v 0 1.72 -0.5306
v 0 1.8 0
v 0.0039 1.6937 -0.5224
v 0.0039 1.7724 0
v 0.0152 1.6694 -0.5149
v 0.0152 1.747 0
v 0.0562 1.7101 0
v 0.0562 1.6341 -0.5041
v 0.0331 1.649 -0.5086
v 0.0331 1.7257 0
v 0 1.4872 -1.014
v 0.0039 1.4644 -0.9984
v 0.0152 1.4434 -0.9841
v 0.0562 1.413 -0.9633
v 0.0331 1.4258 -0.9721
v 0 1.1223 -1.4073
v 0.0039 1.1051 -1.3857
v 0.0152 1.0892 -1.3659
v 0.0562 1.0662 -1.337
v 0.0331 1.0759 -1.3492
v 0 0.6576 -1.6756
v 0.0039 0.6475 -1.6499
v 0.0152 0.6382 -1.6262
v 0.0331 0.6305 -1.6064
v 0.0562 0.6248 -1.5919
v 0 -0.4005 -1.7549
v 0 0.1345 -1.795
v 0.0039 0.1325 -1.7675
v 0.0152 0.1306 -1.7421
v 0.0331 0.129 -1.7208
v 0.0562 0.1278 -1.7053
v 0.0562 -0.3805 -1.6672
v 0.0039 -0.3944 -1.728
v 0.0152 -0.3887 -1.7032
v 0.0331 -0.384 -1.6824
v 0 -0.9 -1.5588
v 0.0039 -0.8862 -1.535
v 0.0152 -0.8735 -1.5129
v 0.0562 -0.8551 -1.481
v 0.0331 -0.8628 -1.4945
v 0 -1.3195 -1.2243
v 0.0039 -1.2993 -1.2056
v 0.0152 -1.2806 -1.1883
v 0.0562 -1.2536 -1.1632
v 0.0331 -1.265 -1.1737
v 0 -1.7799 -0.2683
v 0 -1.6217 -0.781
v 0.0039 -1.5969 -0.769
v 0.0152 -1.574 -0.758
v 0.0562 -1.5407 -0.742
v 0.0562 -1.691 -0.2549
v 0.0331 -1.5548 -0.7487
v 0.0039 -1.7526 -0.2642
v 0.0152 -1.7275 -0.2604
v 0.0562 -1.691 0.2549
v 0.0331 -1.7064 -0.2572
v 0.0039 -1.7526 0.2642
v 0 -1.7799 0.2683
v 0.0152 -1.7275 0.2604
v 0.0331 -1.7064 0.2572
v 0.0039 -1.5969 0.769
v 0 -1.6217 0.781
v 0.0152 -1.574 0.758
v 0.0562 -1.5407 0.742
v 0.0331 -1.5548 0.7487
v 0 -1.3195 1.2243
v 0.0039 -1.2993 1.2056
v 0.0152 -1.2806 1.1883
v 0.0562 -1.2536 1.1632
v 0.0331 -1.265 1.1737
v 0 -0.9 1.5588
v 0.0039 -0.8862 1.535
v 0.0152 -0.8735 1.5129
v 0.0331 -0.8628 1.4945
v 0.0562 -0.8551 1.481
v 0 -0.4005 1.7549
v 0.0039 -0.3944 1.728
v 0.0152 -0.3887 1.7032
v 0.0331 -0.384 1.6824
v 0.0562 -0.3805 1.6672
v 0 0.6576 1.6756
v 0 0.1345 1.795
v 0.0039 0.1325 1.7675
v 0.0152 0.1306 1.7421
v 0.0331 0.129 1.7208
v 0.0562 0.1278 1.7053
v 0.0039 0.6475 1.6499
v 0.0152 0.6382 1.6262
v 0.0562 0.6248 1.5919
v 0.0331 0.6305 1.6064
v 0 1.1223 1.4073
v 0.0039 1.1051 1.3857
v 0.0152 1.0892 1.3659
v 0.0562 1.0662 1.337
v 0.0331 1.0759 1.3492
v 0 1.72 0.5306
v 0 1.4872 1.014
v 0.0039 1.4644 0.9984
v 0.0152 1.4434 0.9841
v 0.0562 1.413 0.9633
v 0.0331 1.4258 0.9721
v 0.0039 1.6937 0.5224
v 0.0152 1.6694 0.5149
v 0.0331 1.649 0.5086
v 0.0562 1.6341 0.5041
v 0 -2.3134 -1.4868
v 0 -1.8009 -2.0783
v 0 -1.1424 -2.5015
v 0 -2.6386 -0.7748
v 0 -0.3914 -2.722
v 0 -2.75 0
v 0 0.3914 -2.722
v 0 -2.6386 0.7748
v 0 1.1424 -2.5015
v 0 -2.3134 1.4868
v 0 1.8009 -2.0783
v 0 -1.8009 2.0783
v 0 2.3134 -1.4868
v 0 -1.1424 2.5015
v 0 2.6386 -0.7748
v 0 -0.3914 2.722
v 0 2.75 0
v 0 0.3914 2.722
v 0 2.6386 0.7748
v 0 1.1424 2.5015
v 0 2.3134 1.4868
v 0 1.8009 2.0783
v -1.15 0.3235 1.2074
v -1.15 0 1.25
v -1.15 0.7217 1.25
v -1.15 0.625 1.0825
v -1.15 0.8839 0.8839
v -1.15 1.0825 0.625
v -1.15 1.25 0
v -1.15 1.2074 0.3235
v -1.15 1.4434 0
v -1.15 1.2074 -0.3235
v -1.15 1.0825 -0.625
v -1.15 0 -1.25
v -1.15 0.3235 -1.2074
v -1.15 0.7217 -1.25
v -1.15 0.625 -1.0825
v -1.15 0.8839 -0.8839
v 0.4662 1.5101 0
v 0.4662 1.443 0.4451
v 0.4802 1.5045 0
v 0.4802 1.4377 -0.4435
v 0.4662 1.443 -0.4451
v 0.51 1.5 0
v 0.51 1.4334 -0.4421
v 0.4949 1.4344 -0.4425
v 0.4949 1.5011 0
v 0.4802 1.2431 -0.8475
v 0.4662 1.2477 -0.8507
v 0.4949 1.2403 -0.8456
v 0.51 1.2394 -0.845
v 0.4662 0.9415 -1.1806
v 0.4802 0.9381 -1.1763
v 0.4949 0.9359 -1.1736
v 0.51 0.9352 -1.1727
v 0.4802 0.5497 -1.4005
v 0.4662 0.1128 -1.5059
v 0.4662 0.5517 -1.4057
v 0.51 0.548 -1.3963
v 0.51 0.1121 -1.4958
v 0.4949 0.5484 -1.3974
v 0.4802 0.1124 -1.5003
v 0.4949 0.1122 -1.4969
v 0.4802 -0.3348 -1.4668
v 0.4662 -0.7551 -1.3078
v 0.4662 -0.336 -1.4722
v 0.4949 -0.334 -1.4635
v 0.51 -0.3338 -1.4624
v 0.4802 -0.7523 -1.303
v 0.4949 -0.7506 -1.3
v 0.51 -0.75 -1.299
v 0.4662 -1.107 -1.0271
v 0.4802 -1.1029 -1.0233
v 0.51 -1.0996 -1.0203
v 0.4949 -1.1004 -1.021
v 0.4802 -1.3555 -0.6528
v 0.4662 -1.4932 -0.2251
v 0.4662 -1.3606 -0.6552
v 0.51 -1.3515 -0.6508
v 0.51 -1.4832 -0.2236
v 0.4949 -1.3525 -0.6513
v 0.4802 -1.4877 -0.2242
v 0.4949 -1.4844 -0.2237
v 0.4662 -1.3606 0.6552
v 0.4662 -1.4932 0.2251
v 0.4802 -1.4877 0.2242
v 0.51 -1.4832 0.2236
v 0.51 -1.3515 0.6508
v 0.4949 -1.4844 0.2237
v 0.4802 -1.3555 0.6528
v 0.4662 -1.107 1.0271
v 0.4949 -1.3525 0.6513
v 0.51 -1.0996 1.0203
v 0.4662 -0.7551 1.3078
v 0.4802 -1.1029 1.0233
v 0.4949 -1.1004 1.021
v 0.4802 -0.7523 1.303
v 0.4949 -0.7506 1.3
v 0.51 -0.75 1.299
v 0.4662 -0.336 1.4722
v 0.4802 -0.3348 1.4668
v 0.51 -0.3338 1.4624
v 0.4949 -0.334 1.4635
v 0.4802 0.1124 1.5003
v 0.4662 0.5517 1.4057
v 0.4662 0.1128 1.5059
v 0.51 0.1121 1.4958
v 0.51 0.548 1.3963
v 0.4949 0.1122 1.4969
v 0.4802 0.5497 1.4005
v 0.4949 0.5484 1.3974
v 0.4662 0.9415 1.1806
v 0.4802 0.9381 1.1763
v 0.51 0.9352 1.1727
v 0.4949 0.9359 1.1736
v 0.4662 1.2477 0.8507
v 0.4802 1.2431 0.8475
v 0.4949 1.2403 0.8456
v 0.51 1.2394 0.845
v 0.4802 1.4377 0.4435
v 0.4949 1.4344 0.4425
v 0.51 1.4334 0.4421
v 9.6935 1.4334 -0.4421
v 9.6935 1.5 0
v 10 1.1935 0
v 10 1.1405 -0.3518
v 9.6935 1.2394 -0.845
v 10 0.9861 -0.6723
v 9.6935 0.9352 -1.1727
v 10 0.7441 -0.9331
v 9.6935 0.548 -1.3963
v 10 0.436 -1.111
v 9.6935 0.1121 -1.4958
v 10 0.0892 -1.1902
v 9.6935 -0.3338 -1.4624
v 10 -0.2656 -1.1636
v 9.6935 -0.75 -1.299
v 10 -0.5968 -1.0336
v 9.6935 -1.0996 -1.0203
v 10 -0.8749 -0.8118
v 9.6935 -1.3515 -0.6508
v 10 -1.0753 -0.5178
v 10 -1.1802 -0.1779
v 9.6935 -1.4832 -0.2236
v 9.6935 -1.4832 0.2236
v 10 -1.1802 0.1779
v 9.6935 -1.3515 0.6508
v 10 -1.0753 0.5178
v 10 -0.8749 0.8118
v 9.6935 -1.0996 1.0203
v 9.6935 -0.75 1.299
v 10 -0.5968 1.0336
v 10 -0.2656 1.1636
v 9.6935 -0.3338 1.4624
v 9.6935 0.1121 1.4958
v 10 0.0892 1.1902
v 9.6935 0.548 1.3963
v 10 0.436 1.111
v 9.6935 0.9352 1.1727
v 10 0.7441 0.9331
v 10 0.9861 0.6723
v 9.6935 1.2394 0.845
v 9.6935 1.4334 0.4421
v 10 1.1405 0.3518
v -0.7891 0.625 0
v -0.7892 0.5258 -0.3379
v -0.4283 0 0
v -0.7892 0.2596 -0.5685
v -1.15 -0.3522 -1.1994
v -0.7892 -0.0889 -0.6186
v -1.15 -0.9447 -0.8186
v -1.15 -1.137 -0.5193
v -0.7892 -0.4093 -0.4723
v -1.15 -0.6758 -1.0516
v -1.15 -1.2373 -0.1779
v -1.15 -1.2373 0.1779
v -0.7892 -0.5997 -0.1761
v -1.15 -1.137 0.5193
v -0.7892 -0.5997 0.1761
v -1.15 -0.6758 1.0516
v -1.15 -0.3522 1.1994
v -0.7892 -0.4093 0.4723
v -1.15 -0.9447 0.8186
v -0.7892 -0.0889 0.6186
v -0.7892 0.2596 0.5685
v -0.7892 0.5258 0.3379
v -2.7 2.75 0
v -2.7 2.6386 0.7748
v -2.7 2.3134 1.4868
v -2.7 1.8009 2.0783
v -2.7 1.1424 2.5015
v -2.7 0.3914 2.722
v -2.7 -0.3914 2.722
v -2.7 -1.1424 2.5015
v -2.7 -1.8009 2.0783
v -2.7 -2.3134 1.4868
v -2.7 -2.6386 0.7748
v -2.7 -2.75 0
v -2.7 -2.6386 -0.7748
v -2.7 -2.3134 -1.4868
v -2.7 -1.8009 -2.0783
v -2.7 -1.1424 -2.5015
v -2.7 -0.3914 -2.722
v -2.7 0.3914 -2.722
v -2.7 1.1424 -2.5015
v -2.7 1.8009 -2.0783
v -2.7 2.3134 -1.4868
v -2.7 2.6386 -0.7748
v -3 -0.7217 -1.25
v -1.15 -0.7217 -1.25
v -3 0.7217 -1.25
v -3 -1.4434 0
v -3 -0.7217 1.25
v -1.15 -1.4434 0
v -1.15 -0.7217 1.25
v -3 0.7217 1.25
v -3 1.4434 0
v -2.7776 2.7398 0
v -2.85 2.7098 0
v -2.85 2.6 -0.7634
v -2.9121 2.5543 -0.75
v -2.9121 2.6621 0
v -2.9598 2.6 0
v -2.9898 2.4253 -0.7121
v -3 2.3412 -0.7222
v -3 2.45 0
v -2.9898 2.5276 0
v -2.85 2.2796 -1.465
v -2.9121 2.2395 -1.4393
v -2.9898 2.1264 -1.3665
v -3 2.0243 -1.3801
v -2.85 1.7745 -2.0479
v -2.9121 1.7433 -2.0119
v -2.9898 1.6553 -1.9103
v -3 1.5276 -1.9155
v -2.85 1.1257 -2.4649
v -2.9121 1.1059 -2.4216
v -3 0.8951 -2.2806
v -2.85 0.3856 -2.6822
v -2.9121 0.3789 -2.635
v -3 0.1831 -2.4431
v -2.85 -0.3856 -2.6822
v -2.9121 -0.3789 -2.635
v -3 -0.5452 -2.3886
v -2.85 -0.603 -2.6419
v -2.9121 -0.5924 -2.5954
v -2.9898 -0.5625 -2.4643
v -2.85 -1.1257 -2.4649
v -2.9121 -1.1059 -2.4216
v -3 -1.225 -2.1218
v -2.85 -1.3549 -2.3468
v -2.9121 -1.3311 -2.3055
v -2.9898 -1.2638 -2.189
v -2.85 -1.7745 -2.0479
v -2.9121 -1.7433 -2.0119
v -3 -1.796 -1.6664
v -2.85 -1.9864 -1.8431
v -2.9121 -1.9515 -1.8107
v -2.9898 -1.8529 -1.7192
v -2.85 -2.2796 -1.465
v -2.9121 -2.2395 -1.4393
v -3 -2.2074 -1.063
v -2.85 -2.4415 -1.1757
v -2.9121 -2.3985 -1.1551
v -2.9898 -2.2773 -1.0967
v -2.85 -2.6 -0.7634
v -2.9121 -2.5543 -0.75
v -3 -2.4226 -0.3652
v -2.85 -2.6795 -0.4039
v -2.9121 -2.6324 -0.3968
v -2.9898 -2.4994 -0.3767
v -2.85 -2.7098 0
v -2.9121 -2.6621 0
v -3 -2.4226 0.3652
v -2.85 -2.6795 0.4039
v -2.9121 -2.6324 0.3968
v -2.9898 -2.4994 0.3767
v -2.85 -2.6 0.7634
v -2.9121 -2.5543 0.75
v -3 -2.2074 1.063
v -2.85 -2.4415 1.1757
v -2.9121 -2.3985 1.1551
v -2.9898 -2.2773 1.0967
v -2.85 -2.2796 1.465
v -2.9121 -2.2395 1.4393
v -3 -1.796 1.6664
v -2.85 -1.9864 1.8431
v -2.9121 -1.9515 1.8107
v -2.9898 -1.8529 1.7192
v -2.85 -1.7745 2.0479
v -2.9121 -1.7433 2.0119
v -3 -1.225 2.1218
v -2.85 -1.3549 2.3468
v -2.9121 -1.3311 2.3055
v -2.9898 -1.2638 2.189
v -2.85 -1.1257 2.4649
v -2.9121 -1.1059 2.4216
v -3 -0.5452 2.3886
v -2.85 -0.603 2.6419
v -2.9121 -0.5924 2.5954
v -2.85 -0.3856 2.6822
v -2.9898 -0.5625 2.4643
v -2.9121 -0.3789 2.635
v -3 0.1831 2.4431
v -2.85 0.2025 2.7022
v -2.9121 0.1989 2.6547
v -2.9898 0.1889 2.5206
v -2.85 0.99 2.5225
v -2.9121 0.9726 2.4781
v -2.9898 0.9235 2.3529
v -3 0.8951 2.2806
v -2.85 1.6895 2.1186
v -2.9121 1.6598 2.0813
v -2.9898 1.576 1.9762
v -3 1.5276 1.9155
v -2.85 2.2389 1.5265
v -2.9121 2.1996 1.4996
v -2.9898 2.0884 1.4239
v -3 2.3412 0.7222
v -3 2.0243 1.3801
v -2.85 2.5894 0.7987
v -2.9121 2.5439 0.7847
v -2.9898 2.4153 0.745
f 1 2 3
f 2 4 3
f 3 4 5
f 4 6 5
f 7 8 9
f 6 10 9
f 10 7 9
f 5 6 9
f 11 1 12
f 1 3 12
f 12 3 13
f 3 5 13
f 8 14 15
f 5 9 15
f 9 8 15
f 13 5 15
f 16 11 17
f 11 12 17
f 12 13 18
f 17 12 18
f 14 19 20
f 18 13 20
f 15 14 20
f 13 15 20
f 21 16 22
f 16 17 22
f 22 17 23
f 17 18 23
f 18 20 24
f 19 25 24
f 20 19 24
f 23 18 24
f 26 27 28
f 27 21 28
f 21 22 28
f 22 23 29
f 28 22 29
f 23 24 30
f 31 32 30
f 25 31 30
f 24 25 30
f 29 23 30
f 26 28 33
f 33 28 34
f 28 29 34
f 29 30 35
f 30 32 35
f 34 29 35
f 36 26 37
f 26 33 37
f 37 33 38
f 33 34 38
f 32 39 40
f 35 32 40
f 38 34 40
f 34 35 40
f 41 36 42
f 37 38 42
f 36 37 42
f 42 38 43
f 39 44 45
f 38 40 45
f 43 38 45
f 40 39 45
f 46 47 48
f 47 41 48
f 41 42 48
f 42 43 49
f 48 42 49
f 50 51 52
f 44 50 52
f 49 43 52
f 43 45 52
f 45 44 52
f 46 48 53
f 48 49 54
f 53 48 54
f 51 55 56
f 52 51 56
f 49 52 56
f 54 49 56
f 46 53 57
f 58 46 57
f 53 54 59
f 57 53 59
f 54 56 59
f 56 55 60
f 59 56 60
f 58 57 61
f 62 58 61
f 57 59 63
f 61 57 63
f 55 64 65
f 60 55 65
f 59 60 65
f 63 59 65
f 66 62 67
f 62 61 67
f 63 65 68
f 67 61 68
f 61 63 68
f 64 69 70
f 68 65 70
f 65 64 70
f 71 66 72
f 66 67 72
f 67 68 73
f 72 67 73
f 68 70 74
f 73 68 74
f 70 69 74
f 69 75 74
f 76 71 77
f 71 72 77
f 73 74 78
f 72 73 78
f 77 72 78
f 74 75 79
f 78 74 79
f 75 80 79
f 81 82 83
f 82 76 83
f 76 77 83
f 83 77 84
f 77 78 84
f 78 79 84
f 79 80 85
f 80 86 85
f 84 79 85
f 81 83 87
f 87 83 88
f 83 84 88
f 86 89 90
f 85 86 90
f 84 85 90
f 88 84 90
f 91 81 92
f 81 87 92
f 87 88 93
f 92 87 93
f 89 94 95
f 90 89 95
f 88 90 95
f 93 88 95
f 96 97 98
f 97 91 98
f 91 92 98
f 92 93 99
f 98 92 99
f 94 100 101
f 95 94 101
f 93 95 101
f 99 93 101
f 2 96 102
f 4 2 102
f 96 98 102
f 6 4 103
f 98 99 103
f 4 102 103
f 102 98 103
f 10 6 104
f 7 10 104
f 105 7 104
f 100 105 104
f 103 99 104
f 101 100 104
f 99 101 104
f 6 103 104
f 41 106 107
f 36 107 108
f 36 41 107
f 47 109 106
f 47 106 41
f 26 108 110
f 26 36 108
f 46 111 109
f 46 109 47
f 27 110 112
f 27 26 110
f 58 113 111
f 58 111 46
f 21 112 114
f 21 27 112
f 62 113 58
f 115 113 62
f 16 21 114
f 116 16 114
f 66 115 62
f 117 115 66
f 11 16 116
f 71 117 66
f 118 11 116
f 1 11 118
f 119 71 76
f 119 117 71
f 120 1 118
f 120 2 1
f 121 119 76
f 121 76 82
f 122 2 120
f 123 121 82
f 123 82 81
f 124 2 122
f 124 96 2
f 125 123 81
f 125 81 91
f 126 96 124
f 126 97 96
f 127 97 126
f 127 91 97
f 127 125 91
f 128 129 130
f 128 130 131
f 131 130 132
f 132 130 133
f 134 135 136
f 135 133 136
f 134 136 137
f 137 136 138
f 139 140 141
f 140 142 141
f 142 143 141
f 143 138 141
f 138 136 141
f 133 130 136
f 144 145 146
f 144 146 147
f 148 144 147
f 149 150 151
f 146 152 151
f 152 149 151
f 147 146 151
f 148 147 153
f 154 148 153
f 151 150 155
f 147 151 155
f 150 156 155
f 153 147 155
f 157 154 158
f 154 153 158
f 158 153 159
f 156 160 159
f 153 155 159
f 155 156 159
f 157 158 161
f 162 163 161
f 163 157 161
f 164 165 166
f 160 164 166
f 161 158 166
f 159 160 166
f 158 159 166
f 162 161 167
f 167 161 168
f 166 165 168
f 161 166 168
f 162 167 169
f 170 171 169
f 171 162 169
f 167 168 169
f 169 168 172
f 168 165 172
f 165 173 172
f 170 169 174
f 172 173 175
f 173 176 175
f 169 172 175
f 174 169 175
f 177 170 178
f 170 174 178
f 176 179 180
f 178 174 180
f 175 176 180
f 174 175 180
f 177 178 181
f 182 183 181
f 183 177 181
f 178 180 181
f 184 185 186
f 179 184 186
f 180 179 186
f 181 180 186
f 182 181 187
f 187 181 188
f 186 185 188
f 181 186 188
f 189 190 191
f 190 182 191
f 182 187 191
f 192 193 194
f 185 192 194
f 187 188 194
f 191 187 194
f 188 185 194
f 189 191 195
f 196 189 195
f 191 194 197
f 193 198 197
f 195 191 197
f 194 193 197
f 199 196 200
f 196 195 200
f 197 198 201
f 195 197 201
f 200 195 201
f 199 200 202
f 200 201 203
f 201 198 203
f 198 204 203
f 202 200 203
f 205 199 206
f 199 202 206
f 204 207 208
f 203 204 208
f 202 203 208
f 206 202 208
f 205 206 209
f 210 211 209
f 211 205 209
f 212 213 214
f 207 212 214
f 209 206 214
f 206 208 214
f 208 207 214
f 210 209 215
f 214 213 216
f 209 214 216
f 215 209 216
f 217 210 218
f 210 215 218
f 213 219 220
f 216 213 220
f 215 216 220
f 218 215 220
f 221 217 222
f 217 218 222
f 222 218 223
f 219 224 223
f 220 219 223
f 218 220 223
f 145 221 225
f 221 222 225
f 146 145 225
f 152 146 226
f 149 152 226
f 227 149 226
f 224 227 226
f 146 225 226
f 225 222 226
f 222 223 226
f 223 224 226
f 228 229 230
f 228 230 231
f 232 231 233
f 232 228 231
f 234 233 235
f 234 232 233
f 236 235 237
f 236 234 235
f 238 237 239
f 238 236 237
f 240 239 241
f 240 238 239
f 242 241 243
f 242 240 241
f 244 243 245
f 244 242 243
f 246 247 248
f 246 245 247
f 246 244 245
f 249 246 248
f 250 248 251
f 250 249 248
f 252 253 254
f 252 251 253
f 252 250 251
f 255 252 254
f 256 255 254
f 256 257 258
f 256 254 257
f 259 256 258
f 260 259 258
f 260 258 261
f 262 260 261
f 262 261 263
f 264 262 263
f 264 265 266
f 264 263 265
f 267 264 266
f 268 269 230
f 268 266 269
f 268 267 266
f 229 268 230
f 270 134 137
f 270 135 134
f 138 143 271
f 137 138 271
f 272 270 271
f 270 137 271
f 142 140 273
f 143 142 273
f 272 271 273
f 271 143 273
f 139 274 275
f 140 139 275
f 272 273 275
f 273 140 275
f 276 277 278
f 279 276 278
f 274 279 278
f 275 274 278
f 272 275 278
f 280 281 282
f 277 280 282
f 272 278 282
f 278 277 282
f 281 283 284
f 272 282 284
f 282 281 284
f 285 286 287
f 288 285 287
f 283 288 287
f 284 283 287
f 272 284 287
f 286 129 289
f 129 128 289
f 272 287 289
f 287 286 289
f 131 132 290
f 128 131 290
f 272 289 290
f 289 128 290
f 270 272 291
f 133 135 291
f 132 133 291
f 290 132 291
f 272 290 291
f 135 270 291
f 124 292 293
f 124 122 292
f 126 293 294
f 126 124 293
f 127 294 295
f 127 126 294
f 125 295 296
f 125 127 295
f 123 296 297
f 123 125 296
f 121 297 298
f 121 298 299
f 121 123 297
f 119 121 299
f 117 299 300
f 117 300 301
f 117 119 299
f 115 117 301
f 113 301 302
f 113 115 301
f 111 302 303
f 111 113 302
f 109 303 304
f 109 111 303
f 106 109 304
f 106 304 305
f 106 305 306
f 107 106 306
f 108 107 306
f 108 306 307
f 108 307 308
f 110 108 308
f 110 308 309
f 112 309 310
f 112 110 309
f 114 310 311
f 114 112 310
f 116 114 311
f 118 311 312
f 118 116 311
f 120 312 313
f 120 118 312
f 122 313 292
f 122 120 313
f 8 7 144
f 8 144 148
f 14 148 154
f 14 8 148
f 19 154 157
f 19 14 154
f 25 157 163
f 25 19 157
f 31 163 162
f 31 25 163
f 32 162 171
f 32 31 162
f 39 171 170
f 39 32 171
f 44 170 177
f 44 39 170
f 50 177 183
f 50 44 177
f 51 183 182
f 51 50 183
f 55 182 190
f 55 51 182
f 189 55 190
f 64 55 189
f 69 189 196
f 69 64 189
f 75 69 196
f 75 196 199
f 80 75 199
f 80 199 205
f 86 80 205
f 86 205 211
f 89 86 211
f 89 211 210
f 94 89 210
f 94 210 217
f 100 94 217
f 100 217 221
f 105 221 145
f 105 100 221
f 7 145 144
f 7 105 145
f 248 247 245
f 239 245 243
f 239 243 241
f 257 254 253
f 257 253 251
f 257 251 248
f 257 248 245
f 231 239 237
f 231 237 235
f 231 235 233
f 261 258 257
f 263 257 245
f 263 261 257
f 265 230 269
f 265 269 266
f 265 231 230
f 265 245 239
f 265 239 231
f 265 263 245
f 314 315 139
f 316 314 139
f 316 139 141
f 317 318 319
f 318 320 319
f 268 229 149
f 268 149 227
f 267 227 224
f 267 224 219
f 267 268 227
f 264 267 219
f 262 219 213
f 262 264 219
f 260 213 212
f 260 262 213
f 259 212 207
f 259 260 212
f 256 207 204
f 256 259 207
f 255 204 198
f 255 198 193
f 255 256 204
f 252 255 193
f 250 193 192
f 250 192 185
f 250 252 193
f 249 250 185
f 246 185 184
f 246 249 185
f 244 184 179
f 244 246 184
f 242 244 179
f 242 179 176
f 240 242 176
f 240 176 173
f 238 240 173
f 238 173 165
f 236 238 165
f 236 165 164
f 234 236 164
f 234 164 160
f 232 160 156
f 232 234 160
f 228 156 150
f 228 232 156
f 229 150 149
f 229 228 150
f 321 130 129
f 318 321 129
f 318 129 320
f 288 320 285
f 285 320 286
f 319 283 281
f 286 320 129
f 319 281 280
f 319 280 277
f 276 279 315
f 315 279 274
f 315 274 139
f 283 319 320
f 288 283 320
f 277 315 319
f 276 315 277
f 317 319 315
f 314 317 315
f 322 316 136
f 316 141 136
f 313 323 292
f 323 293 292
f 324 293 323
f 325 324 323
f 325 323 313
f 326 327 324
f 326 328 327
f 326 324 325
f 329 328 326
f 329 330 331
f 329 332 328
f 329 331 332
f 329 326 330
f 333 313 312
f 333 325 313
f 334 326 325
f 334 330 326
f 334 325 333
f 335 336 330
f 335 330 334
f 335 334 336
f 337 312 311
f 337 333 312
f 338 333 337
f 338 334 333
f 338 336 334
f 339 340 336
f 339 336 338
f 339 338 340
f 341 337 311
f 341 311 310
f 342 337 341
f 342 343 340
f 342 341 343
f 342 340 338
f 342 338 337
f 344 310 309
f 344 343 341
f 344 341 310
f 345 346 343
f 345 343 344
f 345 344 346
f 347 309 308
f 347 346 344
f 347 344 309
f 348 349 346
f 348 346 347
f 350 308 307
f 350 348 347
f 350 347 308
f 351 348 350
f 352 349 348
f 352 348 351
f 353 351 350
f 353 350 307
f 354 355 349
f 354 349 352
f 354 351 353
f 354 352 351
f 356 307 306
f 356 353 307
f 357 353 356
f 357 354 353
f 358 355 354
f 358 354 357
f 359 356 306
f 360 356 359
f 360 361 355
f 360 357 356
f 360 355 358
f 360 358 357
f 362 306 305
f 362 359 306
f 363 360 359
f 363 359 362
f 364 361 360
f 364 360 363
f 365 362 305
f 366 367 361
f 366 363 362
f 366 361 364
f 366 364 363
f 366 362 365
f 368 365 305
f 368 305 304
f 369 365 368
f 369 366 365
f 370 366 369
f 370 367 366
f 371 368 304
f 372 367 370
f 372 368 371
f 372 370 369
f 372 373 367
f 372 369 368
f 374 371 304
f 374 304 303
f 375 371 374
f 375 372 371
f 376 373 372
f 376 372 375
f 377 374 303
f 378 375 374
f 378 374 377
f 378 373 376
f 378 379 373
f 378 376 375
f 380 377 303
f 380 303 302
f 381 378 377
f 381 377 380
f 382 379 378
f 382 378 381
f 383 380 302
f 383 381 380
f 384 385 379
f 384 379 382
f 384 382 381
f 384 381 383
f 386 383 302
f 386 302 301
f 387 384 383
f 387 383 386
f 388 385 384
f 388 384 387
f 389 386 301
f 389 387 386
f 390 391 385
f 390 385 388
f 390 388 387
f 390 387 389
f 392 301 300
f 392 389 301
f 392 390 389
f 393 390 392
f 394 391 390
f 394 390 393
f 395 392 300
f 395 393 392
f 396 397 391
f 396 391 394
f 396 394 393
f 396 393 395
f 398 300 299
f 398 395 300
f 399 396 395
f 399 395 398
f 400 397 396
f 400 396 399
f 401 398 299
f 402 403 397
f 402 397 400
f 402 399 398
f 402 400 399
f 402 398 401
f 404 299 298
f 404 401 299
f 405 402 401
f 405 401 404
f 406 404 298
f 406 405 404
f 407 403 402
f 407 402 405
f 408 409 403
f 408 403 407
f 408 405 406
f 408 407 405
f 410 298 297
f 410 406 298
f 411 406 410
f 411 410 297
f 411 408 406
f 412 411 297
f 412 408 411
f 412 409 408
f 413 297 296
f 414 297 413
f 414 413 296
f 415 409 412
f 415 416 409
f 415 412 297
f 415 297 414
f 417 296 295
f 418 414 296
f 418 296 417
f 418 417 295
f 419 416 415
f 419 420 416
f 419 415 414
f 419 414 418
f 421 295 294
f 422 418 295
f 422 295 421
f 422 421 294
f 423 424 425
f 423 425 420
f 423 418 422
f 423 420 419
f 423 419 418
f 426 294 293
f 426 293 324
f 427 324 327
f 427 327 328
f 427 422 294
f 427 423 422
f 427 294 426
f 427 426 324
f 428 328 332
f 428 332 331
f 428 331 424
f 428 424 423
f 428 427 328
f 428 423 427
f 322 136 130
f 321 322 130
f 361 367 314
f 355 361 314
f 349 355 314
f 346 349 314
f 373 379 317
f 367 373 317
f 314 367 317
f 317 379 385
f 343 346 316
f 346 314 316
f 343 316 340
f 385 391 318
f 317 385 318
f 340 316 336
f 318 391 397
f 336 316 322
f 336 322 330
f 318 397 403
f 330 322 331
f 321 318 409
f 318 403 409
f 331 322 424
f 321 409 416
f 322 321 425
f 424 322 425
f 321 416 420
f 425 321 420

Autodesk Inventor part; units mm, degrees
sketch "Skizze_2" plane through (0, 0, 0) normal (0, 0, 1) x (1, 0, 0)
  line L0 (10, 0) -> (-0.4283, 0)
  line L1 (-0.4283, 0) -> (-1.15, 1.25)
  line L2 (-1.15, 1.25) -> (-3, 1.25)
  line L3 (-3, 1.25) -> (-3, 2.45)
  arc A0 (-2.7, 2.75) -> (-3, 2.45) centre (-2.7, 2.45) ccw
  line L4 (-2.7, 2.75) -> (0, 2.75)
  line L5 (0, 2.75) -> (0, 1.8)
  arc A1 (0, 1.8) -> (0.0562, 1.7101) centre (0.1, 1.8) ccw
  line L6 (0.0562, 1.7101) -> (0.4662, 1.5101)
  arc A2 (0.4662, 1.5101) -> (0.51, 1.5) centre (0.51, 1.6) ccw
  line L7 (0.51, 1.5) -> (9.6935, 1.5)
  line L8 (9.6935, 1.5) -> (10, 1.1935)
  line L9 (10, 1.1935) -> (10, 0)
  line L10 (10, 0) -> (-0.4283, 0)
revolve "Revolution1" add sketch "Skizze_2" angle 360 about axis through (10, 0, 0) along (1, 0, 0)
thread "Thread1" size "M3x0.5" class "6g" standard "ISO Metric profile" length 1.1935
sketch "Skizze_1" plane through (-1.15, 0, 0) normal (1, 0, 0) x (0, 0, -1)
  line L0 (-1.25, -0.7217) -> (0, -1.4434)
  line L1 (0, -1.4434) -> (1.25, -0.7217)
  line L2 (1.25, -0.7217) -> (1.25, 0.7217)
  line L3 (1.25, 0.7217) -> (0, 1.4434)
  line L4 (0, 1.4434) -> (-1.25, 0.7217)
  line L5 (-1.25, 0.7217) -> (-1.25, -0.7217)
extrude "Extrusion1" cut sketch "Skizze_1" against normal blind 2.6
ref_plane "IP1_XY" through (0, 0, 0) normal (1, 0, 0) x (0, 0, -1)
ref_plane "IP1_YZ" through (0, 0, 0) normal (0, 0, -1) x (0, 1, 0)
ref_plane "IP1_ZX" through (0, 0, 0) normal (0, 1, 0) x (1, 0, 0)
ref_plane "IP2_XY" through (-3, 0, 0) normal (1, 0, 0) x (0, 0, -1)
ref_plane "IP2_YZ" through (-3, 0, 0) normal (0, 0, -1) x (0, 1, 0)
ref_plane "IP2_ZX" through (-3, 0, 0) normal (0, 1, 0) x (1, 0, 0)
ref_plane "IP3_XY" through (10, 0, 0) normal (1, 0, 0) x (0, 0, -1)
ref_plane "IP3_YZ" through (10, 0, 0) normal (0, 0, -1) x (0, 1, 0)
ref_plane "IP3_ZX" through (10, 0, 0) normal (0, 1, 0) x (1, 0, 0)
ref_plane "IP4_XY" through (0, 0, 0) normal (1, 0, 0) x (0, 0, -1)
ref_plane "IP4_YZ" through (0, 0, 0) normal (0, 0, -1) x (0, 1, 0)
ref_plane "IP4_ZX" through (0, 0, 0) normal (0, 1, 0) x (1, 0, 0)
properties part number "Slotted head cap screw ISO 4762 - M3x10" material "鋼、炭素鋼"
